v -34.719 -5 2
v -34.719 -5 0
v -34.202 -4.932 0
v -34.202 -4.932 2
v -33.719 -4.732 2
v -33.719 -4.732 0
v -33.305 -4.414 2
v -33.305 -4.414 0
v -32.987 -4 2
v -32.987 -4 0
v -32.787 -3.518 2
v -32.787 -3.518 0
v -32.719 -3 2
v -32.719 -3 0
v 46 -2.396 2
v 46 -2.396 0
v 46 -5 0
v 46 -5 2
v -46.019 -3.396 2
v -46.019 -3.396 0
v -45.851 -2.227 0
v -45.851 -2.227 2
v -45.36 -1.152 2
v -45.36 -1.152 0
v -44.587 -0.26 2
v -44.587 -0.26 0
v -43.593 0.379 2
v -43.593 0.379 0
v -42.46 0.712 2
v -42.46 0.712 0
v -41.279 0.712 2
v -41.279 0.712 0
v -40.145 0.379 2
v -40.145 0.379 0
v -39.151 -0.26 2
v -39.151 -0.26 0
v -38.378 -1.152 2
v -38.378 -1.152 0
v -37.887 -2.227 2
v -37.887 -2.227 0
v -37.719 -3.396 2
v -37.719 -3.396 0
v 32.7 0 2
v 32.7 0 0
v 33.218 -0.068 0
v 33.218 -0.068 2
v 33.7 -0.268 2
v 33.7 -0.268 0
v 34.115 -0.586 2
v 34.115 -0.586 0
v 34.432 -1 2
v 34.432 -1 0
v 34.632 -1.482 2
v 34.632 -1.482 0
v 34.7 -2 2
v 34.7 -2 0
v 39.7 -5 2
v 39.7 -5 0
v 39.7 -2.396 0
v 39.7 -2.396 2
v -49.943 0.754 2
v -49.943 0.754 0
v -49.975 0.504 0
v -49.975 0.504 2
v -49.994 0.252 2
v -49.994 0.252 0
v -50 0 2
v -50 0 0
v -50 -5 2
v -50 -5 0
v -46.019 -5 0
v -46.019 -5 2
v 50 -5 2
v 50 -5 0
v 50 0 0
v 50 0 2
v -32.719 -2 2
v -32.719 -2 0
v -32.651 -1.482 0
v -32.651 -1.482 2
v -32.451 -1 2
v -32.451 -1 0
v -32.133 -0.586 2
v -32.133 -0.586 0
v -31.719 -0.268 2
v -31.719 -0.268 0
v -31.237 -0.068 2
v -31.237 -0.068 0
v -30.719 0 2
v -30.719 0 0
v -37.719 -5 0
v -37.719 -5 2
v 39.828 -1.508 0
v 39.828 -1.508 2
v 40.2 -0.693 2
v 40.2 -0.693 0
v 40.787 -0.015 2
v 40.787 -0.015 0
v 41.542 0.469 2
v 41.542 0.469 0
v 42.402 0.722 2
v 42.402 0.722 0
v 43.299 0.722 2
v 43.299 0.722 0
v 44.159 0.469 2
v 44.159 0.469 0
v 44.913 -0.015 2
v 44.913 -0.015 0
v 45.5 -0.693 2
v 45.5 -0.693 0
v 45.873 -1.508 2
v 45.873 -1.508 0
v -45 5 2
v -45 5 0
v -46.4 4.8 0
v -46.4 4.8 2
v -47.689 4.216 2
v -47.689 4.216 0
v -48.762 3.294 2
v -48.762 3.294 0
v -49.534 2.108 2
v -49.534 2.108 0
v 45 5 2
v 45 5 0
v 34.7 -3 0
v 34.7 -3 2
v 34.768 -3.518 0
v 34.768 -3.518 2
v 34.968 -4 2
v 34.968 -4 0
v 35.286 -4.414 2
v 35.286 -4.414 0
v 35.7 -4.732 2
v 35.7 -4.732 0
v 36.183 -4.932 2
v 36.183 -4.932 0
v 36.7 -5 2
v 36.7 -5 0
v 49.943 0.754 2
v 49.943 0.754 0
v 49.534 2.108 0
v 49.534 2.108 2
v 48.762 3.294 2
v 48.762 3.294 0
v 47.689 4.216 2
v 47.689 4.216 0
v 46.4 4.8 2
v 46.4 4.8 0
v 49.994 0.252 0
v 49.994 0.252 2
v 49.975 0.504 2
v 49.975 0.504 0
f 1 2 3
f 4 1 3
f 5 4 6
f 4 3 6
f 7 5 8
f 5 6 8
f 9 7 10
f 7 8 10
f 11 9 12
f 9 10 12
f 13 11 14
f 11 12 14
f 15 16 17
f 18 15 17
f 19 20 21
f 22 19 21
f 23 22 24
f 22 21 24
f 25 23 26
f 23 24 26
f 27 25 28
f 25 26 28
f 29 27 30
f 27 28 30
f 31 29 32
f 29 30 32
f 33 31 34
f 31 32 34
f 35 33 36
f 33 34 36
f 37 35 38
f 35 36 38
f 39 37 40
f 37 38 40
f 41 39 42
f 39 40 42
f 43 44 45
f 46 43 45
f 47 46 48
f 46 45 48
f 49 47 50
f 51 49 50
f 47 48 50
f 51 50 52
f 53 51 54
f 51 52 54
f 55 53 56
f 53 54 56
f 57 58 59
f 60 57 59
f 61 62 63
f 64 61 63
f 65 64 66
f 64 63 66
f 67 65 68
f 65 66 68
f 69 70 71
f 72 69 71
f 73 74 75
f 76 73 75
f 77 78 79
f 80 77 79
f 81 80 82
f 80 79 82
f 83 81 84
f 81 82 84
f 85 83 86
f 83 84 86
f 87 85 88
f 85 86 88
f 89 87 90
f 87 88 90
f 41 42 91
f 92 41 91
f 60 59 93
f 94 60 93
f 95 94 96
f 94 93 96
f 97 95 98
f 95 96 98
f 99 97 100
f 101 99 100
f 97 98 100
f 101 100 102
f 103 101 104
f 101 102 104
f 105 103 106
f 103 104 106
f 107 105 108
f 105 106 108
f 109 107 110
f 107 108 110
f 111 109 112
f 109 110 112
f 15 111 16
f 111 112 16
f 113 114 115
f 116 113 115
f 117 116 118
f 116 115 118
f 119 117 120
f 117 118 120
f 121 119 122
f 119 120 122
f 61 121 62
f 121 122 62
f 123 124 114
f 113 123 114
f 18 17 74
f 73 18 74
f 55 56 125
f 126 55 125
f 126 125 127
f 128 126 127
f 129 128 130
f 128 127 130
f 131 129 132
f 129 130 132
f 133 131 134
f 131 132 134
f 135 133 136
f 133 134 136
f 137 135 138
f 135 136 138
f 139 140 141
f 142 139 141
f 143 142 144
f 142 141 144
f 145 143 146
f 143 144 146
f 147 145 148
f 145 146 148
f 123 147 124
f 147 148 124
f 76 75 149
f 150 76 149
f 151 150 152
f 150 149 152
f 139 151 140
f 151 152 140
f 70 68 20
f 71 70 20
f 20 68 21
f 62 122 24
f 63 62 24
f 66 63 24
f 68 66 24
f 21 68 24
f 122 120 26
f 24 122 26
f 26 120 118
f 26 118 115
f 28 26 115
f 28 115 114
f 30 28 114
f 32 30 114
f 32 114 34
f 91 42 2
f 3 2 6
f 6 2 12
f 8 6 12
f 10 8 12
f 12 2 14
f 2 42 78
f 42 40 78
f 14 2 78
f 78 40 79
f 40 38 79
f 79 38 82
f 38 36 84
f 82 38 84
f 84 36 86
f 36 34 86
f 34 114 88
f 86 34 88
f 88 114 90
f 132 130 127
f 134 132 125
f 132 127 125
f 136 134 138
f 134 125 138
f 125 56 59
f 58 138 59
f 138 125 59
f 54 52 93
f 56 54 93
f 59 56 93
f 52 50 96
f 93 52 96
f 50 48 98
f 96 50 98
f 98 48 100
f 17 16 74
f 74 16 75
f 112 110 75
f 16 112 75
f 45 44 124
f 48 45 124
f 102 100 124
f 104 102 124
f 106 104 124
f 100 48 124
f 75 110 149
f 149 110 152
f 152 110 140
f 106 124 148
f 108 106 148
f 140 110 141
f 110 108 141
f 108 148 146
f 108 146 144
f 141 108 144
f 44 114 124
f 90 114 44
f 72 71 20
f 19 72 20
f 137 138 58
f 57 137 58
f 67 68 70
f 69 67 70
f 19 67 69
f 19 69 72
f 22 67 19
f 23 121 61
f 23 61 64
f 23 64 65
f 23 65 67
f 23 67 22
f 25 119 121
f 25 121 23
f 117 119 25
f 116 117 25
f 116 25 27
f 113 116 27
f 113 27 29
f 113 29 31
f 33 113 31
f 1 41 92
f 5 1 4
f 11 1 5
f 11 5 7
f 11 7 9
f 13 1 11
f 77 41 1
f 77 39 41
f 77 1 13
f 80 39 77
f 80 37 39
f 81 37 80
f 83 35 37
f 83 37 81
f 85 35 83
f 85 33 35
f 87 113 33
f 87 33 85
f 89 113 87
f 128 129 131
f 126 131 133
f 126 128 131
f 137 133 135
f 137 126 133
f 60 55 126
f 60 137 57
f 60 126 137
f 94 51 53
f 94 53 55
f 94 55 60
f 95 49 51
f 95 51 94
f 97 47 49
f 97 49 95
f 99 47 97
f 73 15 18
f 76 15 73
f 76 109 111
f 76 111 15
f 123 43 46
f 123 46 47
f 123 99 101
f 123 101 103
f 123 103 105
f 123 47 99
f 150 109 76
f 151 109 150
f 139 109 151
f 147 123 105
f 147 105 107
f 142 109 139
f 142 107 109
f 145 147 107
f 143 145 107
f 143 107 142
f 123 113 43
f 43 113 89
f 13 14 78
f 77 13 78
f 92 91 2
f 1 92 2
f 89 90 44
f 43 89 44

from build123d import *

# Parameters (mm, degrees)
F1_DEPTH = 2


with BuildPart() as f1:
    # F0 (on Top) → F1 (new body)
    with BuildSketch(Plane.XY):
        with BuildLine():
            ThreePointArc((49.94281, 0.754074), (48.258039, 3.792781), (45, 5))
            Line((45, 5), (-45, 5))
            ThreePointArc((-45, 5), (-48.258039, 3.792781), (-49.94281, 0.754074))
            ThreePointArc((-49.94281, 0.754074), (-49.985682, 0.37812), (-50, 0))
            Line((-50, 0), (-50, -5))
            Line((-50, -5), (-46.019139, -5))
            Line((-46.019139, -5), (-46.019139, -3.395926))
            ThreePointArc((-46.019139, -3.395926), (-41.869139, 0.754074), (-37.719139, -3.395926))
            Line((-37.719139, -3.395926), (-37.719139, -5))
            Line((-37.719139, -5), (-34.719139, -5))
            ThreePointArc((-34.719139, -5), (-33.304926, -4.414214), (-32.719139, -3))
            Line((-32.719139, -3), (-32.719139, -2))
            ThreePointArc((-32.719139, -2), (-32.133353, -0.585786), (-30.719139, 0))
            Line((-30.719139, 0), (32.700289, 0))
            ThreePointArc((32.700289, 0), (34.114502, -0.585786), (34.700289, -2))
            Line((34.700289, -2), (34.700289, -3))
            ThreePointArc((34.700289, -3), (35.286075, -4.414214), (36.700289, -5))
            Line((36.700289, -5), (39.700289, -5))
            Line((39.700289, -5), (39.700289, -2.395926))
            ThreePointArc((39.700289, -2.395926), (42.850289, 0.754074), (46.000289, -2.395926))
            Line((46.000289, -2.395926), (46.000289, -5))
            Line((46.000289, -5), (50, -5))
            Line((50, -5), (50, 0))
            ThreePointArc((50, 0), (49.985682, 0.37812), (49.94281, 0.754074))
        make_face()
    extrude(amount=F1_DEPTH)


solid = f1.part
